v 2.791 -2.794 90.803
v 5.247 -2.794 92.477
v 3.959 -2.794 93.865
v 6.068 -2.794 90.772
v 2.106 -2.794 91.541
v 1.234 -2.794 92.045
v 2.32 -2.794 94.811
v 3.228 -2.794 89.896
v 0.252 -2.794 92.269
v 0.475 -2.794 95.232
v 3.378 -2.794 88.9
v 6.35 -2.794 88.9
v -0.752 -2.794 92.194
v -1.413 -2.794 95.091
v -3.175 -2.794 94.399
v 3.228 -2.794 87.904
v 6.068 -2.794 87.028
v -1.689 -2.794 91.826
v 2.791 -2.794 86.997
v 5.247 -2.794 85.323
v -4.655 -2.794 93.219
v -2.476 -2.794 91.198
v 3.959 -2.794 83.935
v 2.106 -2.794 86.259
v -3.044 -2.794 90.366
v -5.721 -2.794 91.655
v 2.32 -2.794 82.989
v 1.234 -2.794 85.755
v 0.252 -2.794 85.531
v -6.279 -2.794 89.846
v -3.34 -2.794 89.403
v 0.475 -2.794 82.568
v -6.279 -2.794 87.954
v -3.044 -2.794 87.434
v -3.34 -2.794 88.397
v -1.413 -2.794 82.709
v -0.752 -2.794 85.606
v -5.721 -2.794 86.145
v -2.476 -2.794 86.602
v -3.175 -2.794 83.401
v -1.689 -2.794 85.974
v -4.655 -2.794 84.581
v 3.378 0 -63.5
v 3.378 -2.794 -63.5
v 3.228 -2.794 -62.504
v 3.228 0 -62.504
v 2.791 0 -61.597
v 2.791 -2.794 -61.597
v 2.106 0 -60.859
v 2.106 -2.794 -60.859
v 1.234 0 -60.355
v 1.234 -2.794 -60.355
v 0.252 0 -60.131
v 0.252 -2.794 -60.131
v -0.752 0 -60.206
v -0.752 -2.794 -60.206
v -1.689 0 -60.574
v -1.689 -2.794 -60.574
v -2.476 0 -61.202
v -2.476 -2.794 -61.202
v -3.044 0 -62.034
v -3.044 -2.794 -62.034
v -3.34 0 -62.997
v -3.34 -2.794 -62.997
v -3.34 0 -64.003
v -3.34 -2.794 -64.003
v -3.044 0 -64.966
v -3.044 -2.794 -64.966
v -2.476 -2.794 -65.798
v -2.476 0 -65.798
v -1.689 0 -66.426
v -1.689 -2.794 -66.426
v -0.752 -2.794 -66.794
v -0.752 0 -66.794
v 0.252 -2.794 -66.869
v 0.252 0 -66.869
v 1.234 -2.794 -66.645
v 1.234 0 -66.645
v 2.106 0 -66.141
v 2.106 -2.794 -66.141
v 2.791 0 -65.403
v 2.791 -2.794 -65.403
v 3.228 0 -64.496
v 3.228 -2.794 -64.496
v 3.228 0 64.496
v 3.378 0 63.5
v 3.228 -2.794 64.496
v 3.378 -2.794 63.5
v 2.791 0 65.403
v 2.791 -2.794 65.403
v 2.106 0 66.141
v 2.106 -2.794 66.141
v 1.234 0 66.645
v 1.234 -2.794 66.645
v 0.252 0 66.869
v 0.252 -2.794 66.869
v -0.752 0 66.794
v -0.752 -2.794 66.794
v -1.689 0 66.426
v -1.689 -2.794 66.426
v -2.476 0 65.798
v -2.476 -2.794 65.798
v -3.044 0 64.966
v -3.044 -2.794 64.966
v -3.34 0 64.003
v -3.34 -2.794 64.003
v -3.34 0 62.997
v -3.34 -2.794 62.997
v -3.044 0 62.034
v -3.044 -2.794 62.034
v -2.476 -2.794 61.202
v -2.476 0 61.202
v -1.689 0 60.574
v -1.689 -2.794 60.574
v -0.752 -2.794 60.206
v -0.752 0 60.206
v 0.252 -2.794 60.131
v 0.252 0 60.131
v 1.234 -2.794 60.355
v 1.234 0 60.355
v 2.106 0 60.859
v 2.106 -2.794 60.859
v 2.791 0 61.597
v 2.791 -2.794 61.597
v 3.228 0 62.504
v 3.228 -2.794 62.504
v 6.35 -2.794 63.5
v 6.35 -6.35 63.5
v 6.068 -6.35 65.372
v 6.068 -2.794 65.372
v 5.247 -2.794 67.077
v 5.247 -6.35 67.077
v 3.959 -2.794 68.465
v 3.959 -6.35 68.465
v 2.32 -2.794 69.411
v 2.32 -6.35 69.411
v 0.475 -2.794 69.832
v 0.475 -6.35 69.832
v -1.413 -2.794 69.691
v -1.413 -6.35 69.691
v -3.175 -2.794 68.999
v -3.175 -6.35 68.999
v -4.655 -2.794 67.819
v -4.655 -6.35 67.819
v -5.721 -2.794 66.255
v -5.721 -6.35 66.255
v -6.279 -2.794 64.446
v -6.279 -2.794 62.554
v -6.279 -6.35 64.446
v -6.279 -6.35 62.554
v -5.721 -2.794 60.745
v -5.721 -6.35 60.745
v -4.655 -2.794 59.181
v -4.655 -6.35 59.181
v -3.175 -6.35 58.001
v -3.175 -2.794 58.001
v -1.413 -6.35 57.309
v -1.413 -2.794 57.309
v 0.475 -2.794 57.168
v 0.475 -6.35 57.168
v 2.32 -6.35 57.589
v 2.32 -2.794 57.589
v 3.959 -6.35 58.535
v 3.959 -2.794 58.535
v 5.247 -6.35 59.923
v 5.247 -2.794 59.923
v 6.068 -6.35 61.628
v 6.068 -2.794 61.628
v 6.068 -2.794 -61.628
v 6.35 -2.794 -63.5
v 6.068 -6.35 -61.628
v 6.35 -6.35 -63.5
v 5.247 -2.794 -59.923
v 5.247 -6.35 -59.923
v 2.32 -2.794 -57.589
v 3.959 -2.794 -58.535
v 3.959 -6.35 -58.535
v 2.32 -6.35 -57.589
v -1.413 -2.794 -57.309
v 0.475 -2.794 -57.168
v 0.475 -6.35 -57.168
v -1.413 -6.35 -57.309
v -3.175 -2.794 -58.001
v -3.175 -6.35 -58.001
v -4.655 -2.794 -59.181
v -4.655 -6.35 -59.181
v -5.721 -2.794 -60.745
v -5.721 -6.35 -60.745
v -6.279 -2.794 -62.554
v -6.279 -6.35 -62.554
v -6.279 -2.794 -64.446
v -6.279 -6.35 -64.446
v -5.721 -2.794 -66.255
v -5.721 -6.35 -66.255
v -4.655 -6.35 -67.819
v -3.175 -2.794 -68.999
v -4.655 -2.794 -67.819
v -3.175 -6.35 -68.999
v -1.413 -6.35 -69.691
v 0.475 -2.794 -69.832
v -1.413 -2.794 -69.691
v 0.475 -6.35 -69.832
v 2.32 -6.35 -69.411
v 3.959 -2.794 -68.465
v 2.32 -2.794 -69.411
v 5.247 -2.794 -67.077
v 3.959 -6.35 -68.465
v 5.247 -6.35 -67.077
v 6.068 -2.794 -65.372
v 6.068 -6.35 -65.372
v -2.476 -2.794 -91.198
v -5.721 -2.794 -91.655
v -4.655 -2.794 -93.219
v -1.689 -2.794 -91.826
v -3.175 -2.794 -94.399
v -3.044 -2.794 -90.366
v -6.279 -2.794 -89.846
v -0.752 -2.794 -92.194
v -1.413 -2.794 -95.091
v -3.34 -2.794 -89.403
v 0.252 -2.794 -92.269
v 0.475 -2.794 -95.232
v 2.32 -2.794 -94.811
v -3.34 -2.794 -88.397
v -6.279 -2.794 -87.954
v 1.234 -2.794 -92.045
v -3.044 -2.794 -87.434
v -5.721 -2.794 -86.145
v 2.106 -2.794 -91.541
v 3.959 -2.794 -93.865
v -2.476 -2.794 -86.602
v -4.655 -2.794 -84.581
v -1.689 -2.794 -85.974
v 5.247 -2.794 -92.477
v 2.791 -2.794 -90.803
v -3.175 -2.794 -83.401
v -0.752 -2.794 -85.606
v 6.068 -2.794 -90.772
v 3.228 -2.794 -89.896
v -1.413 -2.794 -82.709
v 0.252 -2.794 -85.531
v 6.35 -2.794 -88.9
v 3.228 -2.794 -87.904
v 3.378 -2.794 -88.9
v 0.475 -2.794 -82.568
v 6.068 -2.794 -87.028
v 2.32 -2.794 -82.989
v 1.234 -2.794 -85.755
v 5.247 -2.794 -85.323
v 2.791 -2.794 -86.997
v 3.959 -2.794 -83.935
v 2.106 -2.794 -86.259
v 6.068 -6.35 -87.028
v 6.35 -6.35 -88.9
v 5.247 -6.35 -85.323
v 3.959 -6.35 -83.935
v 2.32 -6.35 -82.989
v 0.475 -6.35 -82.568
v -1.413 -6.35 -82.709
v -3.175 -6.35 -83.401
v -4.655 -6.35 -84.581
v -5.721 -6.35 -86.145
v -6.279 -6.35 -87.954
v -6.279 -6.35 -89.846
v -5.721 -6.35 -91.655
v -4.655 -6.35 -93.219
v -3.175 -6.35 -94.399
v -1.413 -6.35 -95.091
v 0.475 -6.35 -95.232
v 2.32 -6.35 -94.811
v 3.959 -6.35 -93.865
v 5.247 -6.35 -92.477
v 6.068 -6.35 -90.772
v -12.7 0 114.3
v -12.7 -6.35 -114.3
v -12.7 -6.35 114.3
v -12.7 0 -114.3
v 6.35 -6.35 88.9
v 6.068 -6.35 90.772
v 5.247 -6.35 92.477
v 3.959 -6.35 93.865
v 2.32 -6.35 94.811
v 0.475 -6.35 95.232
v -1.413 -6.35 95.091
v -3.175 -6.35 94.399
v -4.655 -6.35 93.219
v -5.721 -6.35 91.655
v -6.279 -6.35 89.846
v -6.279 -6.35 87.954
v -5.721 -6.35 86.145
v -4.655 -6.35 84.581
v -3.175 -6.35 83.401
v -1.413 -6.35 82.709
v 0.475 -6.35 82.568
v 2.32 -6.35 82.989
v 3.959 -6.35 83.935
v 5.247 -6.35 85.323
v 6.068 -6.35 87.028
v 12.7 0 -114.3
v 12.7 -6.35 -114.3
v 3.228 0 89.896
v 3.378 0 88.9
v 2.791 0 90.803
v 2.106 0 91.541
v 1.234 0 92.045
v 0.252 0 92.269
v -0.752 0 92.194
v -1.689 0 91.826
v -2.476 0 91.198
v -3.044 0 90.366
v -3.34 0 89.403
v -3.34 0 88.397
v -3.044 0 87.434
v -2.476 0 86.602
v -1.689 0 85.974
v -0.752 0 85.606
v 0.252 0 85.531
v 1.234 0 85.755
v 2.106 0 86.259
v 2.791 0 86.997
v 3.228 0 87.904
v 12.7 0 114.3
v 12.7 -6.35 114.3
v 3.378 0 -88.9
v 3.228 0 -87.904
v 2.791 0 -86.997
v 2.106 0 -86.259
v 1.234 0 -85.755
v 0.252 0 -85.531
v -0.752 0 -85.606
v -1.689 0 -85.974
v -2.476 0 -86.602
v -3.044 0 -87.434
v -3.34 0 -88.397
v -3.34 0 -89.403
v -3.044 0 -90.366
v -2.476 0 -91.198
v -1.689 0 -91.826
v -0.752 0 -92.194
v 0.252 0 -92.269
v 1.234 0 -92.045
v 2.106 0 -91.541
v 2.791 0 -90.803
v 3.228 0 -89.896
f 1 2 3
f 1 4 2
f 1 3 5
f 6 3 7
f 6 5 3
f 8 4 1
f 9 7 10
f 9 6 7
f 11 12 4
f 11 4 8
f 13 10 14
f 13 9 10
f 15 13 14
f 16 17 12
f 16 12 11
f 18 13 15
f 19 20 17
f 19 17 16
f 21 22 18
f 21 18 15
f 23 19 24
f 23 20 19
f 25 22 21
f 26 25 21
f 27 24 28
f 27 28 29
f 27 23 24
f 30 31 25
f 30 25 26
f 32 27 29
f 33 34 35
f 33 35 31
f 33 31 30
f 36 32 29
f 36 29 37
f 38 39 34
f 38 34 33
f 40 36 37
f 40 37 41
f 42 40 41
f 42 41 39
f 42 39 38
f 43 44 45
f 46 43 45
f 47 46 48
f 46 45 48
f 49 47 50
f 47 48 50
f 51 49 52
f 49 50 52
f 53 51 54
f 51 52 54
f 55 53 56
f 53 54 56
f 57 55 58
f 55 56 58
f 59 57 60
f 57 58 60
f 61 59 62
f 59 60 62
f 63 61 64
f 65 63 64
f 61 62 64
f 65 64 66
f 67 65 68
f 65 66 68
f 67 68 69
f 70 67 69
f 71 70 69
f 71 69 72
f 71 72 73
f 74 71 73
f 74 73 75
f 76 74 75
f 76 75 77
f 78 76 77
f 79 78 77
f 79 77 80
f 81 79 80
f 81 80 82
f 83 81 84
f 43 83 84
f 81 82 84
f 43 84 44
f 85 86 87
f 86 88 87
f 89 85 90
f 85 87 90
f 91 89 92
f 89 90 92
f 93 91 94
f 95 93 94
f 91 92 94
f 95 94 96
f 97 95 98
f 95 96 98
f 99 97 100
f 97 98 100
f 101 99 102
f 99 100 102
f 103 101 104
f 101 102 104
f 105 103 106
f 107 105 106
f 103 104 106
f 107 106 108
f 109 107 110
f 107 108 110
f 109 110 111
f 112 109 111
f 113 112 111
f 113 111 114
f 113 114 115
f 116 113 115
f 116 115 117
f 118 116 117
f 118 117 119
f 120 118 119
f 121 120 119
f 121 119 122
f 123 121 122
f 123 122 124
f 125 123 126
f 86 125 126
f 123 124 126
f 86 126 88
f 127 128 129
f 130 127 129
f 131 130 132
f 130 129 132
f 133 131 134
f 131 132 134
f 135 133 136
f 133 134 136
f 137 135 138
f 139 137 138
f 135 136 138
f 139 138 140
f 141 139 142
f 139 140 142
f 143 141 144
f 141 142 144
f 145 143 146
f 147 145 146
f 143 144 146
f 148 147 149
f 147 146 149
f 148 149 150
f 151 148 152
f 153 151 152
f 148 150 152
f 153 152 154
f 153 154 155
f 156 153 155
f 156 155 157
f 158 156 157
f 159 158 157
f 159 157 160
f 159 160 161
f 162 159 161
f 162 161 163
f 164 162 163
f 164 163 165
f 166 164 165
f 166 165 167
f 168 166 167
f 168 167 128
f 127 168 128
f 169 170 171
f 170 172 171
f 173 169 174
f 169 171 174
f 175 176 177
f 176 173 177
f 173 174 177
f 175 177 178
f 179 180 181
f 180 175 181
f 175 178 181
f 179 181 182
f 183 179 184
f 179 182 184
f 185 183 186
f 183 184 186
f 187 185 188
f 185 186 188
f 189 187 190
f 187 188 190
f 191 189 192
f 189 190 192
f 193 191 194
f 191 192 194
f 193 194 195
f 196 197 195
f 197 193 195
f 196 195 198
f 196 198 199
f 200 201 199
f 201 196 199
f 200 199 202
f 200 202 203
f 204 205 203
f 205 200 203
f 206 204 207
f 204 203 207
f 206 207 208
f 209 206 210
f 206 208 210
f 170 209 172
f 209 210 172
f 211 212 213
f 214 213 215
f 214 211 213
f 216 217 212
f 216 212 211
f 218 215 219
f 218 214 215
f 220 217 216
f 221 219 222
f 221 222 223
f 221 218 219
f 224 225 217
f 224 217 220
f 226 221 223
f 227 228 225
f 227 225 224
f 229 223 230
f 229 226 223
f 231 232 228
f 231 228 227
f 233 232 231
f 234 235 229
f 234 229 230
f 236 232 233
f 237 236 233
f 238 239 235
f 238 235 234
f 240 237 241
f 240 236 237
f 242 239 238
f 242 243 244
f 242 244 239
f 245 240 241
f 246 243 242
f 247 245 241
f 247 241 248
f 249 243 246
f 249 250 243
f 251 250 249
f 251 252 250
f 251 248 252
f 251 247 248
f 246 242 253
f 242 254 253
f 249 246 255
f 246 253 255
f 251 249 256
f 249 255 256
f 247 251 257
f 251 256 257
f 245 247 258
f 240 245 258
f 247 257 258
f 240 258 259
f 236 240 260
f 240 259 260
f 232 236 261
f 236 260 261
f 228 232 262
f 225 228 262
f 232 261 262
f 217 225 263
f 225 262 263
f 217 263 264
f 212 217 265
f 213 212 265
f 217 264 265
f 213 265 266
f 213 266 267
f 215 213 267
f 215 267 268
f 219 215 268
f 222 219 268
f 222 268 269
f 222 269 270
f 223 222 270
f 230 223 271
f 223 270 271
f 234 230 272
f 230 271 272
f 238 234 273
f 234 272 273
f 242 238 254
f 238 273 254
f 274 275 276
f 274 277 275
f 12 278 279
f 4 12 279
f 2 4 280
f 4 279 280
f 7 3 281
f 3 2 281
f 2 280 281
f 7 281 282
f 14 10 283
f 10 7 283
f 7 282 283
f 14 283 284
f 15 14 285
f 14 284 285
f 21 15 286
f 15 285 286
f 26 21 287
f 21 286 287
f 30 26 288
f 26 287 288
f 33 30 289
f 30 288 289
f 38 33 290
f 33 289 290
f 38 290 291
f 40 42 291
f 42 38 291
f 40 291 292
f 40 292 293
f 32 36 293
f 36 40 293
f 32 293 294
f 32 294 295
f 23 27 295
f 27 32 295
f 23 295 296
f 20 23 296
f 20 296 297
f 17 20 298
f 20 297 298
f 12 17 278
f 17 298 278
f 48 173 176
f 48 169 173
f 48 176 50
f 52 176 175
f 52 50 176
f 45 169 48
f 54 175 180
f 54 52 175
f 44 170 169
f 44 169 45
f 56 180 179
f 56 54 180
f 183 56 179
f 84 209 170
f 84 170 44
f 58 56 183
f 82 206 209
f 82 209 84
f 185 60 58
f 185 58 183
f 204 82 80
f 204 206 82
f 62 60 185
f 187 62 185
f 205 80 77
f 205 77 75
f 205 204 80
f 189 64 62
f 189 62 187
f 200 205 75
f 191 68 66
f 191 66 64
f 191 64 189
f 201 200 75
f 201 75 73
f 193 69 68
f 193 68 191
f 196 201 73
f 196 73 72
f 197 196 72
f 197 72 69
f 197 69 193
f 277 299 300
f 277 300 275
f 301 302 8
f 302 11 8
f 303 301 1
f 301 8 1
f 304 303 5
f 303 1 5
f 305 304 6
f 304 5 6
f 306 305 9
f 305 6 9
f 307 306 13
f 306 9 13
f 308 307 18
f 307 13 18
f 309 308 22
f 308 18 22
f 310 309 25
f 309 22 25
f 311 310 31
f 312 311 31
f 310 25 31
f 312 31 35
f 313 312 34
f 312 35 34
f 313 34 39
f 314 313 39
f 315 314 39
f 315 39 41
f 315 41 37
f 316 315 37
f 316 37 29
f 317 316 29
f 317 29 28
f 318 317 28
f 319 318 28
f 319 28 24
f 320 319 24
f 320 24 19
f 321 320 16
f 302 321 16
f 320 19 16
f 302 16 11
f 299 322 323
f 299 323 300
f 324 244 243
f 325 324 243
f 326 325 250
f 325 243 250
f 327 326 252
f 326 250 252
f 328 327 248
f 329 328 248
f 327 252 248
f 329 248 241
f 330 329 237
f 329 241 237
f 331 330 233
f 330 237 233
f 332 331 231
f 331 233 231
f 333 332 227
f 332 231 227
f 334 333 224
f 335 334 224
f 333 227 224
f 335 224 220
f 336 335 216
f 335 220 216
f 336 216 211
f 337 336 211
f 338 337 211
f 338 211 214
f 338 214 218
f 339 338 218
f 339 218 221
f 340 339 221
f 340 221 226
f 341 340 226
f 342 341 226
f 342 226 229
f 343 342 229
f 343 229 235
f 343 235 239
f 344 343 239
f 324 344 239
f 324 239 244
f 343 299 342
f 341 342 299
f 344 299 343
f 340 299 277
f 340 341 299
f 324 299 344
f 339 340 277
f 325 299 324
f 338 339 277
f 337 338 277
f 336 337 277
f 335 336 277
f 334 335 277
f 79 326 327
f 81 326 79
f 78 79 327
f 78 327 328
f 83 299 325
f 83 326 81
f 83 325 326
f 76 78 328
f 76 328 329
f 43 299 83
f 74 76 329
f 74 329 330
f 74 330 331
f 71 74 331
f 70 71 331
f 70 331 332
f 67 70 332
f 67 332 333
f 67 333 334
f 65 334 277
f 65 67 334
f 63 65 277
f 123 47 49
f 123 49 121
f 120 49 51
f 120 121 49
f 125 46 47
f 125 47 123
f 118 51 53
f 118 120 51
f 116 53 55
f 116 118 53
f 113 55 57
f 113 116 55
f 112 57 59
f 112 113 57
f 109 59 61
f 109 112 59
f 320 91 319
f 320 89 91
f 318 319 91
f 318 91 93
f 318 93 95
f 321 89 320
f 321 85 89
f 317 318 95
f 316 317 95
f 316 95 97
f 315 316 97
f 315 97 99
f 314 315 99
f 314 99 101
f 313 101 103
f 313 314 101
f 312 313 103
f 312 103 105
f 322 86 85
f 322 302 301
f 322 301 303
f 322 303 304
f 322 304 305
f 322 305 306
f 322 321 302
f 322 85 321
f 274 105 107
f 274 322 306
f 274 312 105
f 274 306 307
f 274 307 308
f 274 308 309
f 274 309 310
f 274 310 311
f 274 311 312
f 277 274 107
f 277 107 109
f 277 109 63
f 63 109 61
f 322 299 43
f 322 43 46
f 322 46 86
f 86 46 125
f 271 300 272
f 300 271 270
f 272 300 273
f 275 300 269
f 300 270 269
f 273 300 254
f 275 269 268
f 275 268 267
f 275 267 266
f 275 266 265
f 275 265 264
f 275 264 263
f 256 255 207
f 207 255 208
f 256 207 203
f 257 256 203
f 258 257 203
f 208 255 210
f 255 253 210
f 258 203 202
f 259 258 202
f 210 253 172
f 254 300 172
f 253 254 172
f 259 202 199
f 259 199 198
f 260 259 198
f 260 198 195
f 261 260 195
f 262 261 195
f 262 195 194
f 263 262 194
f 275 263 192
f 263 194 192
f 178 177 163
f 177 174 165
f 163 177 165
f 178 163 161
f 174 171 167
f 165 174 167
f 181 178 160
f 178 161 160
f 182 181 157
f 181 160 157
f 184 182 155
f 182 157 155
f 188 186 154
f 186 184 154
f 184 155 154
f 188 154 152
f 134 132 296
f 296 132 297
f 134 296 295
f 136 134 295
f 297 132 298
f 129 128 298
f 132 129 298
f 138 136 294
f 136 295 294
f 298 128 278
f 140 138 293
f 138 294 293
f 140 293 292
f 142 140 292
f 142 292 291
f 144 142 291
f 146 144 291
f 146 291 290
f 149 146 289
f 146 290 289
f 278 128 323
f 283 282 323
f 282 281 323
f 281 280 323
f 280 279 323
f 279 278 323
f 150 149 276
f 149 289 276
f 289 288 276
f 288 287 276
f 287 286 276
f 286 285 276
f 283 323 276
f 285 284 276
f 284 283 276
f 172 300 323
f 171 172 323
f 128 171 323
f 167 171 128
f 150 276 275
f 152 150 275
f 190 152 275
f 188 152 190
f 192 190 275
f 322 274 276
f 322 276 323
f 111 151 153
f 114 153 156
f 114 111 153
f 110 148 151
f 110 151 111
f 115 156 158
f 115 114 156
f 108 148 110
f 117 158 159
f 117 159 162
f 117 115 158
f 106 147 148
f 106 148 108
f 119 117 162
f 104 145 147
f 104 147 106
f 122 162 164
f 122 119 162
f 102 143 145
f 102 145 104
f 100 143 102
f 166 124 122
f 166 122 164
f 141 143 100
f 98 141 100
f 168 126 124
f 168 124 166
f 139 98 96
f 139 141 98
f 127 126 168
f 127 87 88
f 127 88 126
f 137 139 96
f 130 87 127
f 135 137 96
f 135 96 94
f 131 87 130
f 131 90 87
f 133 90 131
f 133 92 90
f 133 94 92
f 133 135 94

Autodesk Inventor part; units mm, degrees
ref_plane "YZ Plane" through (0, 0, 0) normal (1, 0, 0) x (0, 1, 0)
ref_plane "XZ Plane" through (0, 0, 0) normal (0, 1, 0) x (-1, 0, 0)
sketch "Sketch1" plane through (0, 0, 0) normal (0, 1, 0) x (-1, 0, 0)
  line L0 (12.7, 114.3) -> (-12.7, 114.3)
  line L1 (-12.7, 114.3) -> (-12.7, -114.3)
  line L2 (-12.7, -114.3) -> (12.7, -114.3)
  line L3 (12.7, -114.3) -> (12.7, 114.3)
  line L4 (12.7, 114.3) -> (-12.7, -114.3) construction
  line L5 (-12.7, 114.3) -> (12.7, -114.3) construction
  point P0 (0, 0)
  dimension "d0" = 25.4
  dimension "d1" = 228.6
extrude "Extrusion1" add sketch "Sketch1" against normal blind 6.35
sketch "Sketch3" plane through (0, -6.35, 0) normal (0, -1, 0) x (1, 0, 0)
  circle A0 centre (0, 63.5) radius 6.35
  line L0 (12.7, 114.3) -> (-12.7, 114.3) projected
  point P0 (0, 0)
  dimension "d5" = 12.7
  dimension "d6" = 50.8
extrude "Extrusion2" cut sketch "Sketch3" against normal blind 3.556
sketch "Sketch4" plane through (0, -2.794, 63.5) normal (0, -1, 0) x (1, 0, 0)
  circle A0 centre (0, 0) radius 3.3782
  point P0 (0, -63.5)
  dimension "d9" = 6.7564
extrude "Extrusion3" cut sketch "Sketch4" against normal through all
ref_plane "Work Plane2" through (-12.7, 0, 76.2) normal (0, 0, 1) x (1, 0, 0)
mirror "Mirror1" about plane through (-12.7, 0, 76.2) normal (0, 0, 1) of "Extrusion3", "Extrusion2"
mirror "Mirror2" about plane through (0, 0, 0) normal (0, 0, 1) of "Extrusion3", "Extrusion2", "Mirror1"
properties part number "BandSawJigSupport"
